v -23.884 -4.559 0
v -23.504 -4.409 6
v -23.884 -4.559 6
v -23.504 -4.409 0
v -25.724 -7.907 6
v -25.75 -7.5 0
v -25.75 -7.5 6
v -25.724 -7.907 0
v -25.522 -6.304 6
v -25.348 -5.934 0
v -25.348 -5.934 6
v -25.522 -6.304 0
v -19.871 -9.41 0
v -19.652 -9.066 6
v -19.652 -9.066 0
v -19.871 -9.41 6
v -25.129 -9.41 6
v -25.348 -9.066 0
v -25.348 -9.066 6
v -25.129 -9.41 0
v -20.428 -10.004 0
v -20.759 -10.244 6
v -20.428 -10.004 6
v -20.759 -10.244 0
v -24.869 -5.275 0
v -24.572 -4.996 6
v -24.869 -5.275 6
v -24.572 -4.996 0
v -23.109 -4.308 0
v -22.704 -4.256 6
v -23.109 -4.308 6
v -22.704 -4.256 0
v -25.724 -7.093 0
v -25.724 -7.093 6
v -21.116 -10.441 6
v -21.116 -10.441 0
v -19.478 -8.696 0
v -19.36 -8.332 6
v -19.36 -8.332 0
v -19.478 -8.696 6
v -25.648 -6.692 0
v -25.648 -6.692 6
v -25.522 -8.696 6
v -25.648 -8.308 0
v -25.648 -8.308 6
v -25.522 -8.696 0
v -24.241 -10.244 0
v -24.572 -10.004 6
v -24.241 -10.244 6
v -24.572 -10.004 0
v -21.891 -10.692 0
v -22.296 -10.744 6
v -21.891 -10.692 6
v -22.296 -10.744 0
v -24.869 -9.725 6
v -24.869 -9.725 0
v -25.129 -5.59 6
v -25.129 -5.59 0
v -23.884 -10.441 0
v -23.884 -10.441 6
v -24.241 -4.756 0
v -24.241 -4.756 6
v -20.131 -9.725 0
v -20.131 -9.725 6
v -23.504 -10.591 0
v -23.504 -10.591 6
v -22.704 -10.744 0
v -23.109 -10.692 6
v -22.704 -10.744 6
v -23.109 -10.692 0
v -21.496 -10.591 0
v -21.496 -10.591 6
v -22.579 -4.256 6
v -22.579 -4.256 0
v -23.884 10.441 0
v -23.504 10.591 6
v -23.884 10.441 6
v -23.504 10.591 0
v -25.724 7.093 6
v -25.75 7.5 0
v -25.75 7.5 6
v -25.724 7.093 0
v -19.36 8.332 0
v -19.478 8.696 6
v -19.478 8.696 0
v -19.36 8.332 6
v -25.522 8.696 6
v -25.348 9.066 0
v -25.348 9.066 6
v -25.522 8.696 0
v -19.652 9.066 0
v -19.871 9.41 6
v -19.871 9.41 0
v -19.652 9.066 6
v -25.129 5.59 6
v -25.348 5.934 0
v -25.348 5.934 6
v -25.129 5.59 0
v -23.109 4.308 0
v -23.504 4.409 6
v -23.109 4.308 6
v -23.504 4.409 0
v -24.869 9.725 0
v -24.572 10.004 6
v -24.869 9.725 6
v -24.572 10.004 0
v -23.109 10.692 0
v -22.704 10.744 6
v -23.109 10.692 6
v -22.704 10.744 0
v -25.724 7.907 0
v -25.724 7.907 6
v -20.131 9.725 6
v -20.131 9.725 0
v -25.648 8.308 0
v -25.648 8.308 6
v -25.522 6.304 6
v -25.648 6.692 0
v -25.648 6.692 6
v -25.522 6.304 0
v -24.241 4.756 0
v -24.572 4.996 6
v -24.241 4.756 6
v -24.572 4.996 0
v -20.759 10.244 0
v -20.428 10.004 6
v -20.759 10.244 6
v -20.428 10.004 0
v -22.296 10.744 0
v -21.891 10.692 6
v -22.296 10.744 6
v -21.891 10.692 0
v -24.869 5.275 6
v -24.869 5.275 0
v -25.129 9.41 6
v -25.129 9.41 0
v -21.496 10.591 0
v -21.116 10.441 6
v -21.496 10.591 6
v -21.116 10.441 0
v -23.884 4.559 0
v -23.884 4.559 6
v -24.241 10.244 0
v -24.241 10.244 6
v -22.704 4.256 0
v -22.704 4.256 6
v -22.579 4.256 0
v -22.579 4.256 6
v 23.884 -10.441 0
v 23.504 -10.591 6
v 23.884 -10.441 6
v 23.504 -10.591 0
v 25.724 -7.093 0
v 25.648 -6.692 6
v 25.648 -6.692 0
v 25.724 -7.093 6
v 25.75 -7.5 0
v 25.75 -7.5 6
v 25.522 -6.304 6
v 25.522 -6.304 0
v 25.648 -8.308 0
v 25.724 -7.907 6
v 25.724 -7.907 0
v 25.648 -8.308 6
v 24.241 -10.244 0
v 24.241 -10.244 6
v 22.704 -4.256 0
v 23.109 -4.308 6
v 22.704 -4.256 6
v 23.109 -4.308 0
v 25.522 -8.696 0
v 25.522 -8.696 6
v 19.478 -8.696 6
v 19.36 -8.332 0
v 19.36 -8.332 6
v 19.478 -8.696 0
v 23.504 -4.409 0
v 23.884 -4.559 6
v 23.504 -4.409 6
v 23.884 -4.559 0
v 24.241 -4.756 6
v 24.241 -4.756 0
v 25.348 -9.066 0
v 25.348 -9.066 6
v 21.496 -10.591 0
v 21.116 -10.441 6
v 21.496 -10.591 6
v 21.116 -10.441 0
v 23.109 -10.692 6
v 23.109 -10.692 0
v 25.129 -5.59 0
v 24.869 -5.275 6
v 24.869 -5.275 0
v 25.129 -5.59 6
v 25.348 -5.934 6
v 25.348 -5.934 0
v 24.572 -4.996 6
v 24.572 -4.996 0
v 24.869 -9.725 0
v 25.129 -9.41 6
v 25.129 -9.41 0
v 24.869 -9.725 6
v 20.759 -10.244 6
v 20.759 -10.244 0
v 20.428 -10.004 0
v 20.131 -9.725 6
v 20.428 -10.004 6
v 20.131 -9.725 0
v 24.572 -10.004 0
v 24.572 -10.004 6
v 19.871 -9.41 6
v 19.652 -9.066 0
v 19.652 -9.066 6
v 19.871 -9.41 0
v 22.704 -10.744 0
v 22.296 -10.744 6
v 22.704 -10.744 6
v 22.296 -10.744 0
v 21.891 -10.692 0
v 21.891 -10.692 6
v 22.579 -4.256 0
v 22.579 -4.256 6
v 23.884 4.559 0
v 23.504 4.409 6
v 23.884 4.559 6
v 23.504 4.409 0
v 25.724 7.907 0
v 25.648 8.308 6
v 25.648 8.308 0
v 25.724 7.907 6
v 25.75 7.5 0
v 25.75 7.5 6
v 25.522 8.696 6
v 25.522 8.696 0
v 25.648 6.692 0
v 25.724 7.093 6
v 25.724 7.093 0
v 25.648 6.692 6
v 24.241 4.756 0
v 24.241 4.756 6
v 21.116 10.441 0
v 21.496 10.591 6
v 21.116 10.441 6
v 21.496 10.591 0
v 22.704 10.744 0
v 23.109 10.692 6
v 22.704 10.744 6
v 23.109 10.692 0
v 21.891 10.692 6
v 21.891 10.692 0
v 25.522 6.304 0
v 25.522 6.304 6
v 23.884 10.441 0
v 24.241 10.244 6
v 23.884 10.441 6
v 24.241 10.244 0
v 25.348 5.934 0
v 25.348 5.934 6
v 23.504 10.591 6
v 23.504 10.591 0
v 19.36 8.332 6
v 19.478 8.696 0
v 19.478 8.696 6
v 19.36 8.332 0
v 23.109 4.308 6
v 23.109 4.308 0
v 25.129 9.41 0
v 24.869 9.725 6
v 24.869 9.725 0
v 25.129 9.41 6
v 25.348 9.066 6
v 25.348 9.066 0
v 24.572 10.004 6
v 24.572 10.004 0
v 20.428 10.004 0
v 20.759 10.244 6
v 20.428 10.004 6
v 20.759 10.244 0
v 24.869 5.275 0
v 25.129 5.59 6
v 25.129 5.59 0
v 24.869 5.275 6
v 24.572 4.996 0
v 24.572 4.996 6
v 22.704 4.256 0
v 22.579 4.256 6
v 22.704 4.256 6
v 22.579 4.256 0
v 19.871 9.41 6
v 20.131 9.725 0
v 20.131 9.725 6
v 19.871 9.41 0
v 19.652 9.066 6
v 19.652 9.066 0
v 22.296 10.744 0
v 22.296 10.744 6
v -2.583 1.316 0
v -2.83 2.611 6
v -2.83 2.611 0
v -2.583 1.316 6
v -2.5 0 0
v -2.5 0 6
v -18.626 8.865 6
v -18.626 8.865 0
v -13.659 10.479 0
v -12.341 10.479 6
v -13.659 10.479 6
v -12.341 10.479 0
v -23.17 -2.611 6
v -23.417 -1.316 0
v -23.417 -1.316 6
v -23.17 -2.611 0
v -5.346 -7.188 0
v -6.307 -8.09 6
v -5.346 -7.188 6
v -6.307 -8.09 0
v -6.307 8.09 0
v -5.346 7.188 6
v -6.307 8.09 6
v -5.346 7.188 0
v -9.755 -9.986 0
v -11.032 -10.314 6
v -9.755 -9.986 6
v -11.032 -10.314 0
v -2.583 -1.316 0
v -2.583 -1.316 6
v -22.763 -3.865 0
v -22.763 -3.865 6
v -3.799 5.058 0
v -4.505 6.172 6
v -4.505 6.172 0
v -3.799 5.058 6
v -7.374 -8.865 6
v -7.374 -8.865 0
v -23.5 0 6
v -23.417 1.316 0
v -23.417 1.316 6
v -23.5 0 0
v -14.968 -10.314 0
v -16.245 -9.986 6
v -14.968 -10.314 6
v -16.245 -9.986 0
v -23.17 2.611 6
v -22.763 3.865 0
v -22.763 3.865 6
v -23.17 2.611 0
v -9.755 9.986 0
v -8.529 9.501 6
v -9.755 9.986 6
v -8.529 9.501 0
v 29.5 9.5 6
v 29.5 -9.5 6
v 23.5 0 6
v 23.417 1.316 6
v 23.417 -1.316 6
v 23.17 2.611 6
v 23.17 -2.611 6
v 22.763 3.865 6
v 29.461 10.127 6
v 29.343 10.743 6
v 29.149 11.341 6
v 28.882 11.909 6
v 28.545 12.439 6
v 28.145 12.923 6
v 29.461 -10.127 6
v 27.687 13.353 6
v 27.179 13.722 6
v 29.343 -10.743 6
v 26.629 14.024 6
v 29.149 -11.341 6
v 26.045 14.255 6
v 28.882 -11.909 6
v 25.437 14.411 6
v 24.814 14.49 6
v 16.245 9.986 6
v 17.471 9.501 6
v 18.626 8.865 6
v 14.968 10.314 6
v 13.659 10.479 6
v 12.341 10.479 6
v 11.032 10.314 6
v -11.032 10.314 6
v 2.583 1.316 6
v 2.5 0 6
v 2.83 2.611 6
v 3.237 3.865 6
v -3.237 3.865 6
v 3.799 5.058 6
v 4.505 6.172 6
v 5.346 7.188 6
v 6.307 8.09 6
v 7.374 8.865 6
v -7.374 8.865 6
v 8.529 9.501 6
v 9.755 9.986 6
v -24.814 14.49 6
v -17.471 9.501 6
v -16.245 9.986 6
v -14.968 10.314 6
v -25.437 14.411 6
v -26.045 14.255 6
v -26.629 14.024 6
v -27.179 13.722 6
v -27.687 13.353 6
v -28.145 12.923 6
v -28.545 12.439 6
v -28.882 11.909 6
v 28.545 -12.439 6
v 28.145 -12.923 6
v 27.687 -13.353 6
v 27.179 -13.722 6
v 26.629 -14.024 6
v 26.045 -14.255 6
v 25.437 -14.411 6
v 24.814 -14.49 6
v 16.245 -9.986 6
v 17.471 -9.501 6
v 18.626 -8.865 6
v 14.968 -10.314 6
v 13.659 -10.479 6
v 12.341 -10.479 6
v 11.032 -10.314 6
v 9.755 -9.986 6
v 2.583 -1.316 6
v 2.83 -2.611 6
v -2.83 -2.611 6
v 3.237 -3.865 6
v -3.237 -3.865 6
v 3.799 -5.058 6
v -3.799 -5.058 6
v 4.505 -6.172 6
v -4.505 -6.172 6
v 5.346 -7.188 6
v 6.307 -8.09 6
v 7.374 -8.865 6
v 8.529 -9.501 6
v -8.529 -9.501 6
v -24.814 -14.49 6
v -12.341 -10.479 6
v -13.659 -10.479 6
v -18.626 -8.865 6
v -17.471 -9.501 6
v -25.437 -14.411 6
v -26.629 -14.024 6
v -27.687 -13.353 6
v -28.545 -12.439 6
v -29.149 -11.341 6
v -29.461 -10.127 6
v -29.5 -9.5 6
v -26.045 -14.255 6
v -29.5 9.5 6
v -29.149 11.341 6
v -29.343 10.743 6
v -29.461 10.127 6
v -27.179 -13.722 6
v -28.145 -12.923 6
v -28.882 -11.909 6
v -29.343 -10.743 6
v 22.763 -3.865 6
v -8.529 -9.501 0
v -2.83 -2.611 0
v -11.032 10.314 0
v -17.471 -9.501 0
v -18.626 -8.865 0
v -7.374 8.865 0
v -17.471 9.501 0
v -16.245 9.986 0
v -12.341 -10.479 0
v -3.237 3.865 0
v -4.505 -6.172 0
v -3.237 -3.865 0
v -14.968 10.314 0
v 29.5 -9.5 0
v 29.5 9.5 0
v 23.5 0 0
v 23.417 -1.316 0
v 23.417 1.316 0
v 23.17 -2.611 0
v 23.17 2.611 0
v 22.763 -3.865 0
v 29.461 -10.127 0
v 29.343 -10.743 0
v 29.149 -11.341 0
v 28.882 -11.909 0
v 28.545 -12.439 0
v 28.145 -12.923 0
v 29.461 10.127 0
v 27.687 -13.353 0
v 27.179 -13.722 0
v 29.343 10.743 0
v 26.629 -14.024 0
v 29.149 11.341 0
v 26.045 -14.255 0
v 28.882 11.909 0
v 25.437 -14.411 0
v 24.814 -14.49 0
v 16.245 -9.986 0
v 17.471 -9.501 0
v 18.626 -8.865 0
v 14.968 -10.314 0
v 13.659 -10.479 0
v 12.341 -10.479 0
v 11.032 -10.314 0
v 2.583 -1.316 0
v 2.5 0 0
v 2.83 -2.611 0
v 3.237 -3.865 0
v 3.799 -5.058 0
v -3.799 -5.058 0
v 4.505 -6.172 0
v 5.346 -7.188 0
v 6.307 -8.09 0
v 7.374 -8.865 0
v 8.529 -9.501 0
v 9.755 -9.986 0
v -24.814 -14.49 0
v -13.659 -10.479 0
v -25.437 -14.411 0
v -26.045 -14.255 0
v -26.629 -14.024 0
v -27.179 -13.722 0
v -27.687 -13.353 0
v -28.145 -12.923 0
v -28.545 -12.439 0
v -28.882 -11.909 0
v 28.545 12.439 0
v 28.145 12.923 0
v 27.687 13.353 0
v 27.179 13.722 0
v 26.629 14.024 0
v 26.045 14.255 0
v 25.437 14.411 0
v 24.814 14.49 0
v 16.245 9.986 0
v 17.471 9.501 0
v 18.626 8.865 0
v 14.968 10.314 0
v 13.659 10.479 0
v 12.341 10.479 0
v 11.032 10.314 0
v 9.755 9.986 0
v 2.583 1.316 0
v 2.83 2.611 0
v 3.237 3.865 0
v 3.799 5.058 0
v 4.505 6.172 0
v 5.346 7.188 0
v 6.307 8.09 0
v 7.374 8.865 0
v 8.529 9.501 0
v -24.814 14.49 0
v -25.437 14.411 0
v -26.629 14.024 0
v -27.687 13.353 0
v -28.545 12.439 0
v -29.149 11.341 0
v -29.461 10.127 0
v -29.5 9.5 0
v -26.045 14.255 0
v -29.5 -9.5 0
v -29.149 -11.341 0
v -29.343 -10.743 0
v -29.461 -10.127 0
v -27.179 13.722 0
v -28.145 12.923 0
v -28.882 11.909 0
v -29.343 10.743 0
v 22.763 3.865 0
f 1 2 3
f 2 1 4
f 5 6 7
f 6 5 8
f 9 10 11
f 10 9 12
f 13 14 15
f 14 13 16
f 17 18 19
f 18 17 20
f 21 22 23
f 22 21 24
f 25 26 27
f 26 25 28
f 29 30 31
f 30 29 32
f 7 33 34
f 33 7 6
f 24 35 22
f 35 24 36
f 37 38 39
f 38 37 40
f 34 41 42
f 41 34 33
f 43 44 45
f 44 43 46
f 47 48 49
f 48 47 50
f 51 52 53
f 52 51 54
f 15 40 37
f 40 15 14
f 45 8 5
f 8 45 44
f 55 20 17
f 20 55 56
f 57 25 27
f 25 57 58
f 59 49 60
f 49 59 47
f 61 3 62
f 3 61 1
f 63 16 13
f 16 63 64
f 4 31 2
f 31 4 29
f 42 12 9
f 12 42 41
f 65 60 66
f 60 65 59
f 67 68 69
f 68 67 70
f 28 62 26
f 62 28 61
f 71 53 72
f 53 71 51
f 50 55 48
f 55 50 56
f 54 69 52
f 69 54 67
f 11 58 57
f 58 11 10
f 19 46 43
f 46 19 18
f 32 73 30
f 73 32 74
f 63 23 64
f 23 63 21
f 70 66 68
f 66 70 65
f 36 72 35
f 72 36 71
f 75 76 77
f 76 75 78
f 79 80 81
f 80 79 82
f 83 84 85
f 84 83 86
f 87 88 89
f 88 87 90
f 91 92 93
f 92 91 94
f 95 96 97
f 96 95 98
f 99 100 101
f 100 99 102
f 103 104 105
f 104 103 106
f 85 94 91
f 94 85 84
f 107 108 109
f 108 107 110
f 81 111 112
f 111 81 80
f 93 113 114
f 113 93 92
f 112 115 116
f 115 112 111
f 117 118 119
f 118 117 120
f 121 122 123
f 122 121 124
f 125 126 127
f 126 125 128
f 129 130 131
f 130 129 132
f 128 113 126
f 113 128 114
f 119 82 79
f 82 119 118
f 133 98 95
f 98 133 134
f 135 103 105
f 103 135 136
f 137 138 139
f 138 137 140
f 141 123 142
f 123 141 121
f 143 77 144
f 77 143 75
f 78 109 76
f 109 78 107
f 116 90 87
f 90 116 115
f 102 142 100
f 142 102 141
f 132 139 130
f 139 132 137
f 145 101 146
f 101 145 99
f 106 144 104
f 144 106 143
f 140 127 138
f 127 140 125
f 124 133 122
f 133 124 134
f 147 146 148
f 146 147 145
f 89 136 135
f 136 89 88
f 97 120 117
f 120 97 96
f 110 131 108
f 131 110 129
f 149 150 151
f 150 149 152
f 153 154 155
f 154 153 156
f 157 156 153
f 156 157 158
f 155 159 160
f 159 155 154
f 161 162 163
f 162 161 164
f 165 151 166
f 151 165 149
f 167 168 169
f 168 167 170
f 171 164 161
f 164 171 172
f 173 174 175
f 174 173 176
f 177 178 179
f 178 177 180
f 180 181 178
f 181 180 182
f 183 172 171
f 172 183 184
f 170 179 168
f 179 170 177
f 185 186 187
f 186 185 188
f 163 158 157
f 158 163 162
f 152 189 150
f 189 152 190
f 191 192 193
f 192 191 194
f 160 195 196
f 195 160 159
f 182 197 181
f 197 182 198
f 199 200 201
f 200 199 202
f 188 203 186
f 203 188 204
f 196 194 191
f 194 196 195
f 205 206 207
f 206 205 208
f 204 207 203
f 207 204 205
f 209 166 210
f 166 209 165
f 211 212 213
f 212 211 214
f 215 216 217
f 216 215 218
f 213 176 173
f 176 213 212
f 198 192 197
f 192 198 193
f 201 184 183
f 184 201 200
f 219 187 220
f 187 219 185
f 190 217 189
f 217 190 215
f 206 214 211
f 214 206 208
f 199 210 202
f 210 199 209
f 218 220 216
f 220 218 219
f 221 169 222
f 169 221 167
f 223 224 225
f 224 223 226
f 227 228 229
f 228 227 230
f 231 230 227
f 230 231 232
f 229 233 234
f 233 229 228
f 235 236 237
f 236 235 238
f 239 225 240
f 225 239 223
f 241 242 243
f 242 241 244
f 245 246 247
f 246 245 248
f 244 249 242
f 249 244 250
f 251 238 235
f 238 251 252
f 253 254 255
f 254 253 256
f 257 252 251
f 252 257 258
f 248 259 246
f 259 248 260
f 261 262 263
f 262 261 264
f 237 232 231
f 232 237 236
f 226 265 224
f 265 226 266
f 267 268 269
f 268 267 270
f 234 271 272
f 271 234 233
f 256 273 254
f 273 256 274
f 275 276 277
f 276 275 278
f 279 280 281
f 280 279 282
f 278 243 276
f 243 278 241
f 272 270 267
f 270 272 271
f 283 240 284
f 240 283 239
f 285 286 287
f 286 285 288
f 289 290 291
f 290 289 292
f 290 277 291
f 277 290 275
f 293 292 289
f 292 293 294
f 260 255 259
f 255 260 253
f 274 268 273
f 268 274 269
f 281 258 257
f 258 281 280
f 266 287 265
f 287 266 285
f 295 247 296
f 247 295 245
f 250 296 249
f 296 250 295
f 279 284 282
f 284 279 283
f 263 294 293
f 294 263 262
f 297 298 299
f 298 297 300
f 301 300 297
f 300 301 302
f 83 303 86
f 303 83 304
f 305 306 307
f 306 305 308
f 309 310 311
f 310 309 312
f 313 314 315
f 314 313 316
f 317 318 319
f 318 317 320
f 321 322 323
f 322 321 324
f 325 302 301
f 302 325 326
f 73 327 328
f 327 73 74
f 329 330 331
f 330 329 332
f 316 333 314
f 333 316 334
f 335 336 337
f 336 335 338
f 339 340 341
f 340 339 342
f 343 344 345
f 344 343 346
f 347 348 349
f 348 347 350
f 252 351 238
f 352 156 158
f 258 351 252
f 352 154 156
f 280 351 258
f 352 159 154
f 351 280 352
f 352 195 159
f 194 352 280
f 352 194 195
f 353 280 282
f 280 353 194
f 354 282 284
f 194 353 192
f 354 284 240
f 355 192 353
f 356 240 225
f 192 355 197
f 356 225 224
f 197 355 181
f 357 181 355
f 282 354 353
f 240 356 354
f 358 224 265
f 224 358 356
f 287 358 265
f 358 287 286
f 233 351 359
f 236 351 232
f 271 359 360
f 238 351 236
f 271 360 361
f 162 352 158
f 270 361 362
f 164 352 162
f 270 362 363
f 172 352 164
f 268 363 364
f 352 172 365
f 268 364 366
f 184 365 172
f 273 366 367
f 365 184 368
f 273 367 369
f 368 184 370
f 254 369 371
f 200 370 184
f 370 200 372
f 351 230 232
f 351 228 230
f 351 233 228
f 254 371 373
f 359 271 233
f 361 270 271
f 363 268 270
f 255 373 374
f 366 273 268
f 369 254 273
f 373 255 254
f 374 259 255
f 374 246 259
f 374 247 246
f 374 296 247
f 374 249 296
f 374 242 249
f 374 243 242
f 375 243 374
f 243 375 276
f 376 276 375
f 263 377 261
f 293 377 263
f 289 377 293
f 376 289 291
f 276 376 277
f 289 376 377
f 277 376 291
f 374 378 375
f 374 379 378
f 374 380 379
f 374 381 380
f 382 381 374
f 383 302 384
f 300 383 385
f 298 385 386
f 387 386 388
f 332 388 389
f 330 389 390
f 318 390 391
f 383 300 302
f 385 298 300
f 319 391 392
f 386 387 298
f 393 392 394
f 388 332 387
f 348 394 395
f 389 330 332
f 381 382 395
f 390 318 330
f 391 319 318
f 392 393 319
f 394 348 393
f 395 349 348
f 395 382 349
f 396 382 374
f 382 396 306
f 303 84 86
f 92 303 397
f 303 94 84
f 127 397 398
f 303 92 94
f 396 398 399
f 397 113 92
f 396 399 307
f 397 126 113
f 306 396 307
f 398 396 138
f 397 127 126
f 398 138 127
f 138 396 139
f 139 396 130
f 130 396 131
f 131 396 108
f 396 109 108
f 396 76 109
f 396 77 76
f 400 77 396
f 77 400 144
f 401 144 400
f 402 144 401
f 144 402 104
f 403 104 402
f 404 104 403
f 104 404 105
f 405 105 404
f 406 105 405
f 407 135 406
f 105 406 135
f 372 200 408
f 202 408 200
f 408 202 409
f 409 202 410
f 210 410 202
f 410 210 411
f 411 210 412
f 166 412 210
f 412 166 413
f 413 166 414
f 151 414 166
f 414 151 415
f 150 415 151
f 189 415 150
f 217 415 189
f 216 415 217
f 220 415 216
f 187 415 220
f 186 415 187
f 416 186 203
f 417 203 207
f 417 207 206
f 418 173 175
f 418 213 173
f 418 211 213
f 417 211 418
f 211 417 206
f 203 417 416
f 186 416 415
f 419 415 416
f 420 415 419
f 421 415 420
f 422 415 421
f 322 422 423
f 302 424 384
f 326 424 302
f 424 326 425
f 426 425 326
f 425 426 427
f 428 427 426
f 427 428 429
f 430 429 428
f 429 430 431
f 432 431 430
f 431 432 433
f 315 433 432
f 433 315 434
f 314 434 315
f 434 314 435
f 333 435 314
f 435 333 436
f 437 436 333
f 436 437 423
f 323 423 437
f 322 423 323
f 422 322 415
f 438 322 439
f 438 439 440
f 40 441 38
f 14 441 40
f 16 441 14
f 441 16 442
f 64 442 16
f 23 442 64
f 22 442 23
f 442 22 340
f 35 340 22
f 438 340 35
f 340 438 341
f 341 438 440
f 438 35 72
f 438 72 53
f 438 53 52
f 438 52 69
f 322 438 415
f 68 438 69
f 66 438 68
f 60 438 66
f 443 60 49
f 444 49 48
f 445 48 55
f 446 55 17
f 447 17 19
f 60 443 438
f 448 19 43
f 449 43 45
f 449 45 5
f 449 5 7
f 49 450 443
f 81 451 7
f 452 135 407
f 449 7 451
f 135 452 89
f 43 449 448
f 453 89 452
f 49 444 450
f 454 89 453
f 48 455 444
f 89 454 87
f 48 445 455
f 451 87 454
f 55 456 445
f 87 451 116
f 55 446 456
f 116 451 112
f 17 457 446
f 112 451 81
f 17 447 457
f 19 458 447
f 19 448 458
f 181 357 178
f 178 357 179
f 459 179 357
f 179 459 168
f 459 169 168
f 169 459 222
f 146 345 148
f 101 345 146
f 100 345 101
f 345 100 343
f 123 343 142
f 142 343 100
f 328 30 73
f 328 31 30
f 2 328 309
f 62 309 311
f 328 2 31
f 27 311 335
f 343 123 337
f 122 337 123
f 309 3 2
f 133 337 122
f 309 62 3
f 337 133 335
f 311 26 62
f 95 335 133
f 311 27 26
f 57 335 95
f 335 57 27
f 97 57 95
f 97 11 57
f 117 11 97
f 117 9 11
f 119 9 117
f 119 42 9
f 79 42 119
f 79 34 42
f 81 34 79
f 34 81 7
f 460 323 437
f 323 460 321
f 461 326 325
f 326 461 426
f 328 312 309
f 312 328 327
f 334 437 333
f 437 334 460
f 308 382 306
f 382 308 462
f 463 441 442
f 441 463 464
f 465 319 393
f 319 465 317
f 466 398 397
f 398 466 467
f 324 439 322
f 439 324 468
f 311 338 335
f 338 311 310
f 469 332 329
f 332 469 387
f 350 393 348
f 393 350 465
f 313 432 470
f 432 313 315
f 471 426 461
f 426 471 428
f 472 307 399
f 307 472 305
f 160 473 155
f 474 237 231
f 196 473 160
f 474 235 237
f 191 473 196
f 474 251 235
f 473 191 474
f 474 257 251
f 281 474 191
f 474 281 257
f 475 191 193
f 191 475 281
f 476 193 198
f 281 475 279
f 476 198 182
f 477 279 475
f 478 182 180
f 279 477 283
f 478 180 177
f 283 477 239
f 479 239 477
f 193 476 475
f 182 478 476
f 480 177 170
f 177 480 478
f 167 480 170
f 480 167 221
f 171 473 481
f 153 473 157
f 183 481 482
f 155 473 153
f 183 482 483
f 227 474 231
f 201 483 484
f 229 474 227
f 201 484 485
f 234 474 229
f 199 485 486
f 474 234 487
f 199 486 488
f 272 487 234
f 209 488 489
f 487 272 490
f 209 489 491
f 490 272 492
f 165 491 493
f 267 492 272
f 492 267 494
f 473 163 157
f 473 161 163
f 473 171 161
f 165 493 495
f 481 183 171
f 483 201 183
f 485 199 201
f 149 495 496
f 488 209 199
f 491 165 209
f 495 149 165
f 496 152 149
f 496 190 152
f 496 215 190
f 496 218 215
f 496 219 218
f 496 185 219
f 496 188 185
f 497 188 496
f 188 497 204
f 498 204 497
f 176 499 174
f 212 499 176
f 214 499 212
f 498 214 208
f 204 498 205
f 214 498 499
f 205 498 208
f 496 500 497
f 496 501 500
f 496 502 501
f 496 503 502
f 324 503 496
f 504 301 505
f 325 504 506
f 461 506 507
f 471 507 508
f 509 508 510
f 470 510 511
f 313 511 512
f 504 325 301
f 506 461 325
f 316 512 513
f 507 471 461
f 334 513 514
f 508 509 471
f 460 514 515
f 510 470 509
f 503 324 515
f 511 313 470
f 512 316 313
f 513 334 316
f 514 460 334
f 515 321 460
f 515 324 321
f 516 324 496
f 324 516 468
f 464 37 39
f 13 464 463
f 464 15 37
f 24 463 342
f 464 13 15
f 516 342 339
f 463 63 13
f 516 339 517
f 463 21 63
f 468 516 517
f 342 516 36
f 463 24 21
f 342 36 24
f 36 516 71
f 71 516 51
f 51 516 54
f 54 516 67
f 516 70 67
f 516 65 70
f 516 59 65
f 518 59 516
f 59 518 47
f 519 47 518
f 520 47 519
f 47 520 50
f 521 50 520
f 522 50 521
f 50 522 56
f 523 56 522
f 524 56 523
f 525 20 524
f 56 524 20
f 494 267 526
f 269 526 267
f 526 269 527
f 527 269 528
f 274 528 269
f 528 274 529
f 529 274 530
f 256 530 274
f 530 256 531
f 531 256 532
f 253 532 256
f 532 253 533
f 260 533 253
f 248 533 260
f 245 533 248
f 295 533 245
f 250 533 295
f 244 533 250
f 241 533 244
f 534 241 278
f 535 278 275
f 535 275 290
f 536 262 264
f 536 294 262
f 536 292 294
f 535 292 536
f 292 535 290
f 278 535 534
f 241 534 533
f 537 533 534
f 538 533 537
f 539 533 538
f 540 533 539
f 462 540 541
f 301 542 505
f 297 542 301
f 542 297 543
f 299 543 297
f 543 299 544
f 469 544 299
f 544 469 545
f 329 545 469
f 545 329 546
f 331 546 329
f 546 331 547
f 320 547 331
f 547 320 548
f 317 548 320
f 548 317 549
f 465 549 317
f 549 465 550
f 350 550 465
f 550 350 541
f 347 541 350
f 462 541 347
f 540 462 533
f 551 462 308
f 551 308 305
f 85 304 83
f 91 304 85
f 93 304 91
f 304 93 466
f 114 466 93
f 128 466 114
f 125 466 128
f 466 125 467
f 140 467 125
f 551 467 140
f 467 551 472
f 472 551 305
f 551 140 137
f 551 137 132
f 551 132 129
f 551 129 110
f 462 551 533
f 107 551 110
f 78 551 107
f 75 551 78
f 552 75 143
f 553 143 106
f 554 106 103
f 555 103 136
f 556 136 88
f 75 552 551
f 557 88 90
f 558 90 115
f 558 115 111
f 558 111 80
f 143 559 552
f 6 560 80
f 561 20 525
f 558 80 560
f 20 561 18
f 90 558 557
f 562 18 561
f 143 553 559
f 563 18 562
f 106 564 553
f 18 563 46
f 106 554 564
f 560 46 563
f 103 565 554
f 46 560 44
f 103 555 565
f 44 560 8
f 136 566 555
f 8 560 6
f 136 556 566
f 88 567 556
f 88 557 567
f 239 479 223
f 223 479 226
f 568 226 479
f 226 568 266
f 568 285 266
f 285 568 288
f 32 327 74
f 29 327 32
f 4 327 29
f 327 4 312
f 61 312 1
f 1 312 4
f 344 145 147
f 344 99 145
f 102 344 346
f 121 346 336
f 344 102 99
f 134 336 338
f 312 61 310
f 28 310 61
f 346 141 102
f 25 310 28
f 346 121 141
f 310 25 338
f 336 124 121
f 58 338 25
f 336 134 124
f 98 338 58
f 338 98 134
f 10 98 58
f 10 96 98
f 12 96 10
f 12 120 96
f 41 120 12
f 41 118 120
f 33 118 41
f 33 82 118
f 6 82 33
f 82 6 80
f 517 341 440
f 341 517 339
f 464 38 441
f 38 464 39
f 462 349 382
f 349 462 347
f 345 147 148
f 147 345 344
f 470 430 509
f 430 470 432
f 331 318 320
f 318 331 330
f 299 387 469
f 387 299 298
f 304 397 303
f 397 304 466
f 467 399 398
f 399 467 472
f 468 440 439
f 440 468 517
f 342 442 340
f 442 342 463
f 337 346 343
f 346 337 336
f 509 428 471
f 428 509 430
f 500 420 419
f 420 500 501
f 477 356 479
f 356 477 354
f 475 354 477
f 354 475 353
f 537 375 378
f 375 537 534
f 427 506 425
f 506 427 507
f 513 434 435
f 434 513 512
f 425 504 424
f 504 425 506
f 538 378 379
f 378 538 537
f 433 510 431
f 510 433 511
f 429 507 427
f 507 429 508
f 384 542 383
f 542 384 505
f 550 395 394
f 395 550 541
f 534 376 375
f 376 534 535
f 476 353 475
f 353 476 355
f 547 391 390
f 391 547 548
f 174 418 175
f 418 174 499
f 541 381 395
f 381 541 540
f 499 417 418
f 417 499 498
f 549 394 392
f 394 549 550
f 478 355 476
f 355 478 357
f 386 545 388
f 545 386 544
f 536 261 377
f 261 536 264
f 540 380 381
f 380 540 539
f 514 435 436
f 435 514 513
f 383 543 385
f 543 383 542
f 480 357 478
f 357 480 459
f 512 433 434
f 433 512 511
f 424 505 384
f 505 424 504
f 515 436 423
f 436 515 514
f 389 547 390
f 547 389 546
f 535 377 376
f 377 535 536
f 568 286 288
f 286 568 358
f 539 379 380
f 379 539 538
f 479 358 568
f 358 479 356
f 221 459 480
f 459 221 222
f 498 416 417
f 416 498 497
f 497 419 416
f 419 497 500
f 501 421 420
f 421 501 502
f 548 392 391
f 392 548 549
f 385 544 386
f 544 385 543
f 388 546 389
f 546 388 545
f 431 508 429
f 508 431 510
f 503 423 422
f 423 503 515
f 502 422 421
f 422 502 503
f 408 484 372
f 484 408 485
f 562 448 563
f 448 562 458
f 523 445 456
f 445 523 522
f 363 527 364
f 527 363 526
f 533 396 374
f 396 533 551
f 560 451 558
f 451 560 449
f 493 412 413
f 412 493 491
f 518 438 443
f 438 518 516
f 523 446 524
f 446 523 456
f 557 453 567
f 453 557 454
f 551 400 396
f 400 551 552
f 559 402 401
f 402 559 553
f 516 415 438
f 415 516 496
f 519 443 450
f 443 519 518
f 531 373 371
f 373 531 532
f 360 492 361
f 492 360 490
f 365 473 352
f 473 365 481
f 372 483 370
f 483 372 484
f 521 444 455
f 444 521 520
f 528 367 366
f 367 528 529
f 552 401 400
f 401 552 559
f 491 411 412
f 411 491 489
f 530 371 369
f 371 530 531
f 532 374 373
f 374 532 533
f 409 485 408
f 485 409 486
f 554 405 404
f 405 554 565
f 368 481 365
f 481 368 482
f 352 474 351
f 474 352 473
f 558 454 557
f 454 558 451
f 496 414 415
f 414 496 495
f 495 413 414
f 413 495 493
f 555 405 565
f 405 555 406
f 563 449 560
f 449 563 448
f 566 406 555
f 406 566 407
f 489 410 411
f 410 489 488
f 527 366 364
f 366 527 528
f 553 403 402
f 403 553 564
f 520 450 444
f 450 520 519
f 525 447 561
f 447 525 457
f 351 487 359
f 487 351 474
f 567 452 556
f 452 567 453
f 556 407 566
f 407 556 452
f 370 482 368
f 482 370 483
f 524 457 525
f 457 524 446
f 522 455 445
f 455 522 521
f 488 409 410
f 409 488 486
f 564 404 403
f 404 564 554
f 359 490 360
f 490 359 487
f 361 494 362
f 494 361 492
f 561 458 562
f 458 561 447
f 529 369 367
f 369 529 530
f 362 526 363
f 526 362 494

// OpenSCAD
$fn = 50;


difference() {
	union() {
		hull() {
			translate(v = [-24.5000000000, 9.5000000000, 0]) {
				cylinder(h = 6, r = 5);
			}
			translate(v = [24.5000000000, 9.5000000000, 0]) {
				cylinder(h = 6, r = 5);
			}
			translate(v = [-24.5000000000, -9.5000000000, 0]) {
				cylinder(h = 6, r = 5);
			}
			translate(v = [24.5000000000, -9.5000000000, 0]) {
				cylinder(h = 6, r = 5);
			}
		}
	}
	union() {
		#translate(v = [-22.5000000000, -7.5000000000, -100.0000000000]) {
			cylinder(h = 200, r = 3.2500000000);
		}
		#translate(v = [-22.5000000000, 7.5000000000, -100.0000000000]) {
			cylinder(h = 200, r = 3.2500000000);
		}
		#translate(v = [22.5000000000, -7.5000000000, -100.0000000000]) {
			cylinder(h = 200, r = 3.2500000000);
		}
		#translate(v = [22.5000000000, 7.5000000000, -100.0000000000]) {
			cylinder(h = 200, r = 3.2500000000);
		}
		#translate(v = [-13.0000000000, 0, 0]) {
			cylinder(h = 6, r = 10.5000000000);
		}
		#translate(v = [13.0000000000, 0, 0]) {
			cylinder(h = 6, r = 10.5000000000);
		}
	}
}
